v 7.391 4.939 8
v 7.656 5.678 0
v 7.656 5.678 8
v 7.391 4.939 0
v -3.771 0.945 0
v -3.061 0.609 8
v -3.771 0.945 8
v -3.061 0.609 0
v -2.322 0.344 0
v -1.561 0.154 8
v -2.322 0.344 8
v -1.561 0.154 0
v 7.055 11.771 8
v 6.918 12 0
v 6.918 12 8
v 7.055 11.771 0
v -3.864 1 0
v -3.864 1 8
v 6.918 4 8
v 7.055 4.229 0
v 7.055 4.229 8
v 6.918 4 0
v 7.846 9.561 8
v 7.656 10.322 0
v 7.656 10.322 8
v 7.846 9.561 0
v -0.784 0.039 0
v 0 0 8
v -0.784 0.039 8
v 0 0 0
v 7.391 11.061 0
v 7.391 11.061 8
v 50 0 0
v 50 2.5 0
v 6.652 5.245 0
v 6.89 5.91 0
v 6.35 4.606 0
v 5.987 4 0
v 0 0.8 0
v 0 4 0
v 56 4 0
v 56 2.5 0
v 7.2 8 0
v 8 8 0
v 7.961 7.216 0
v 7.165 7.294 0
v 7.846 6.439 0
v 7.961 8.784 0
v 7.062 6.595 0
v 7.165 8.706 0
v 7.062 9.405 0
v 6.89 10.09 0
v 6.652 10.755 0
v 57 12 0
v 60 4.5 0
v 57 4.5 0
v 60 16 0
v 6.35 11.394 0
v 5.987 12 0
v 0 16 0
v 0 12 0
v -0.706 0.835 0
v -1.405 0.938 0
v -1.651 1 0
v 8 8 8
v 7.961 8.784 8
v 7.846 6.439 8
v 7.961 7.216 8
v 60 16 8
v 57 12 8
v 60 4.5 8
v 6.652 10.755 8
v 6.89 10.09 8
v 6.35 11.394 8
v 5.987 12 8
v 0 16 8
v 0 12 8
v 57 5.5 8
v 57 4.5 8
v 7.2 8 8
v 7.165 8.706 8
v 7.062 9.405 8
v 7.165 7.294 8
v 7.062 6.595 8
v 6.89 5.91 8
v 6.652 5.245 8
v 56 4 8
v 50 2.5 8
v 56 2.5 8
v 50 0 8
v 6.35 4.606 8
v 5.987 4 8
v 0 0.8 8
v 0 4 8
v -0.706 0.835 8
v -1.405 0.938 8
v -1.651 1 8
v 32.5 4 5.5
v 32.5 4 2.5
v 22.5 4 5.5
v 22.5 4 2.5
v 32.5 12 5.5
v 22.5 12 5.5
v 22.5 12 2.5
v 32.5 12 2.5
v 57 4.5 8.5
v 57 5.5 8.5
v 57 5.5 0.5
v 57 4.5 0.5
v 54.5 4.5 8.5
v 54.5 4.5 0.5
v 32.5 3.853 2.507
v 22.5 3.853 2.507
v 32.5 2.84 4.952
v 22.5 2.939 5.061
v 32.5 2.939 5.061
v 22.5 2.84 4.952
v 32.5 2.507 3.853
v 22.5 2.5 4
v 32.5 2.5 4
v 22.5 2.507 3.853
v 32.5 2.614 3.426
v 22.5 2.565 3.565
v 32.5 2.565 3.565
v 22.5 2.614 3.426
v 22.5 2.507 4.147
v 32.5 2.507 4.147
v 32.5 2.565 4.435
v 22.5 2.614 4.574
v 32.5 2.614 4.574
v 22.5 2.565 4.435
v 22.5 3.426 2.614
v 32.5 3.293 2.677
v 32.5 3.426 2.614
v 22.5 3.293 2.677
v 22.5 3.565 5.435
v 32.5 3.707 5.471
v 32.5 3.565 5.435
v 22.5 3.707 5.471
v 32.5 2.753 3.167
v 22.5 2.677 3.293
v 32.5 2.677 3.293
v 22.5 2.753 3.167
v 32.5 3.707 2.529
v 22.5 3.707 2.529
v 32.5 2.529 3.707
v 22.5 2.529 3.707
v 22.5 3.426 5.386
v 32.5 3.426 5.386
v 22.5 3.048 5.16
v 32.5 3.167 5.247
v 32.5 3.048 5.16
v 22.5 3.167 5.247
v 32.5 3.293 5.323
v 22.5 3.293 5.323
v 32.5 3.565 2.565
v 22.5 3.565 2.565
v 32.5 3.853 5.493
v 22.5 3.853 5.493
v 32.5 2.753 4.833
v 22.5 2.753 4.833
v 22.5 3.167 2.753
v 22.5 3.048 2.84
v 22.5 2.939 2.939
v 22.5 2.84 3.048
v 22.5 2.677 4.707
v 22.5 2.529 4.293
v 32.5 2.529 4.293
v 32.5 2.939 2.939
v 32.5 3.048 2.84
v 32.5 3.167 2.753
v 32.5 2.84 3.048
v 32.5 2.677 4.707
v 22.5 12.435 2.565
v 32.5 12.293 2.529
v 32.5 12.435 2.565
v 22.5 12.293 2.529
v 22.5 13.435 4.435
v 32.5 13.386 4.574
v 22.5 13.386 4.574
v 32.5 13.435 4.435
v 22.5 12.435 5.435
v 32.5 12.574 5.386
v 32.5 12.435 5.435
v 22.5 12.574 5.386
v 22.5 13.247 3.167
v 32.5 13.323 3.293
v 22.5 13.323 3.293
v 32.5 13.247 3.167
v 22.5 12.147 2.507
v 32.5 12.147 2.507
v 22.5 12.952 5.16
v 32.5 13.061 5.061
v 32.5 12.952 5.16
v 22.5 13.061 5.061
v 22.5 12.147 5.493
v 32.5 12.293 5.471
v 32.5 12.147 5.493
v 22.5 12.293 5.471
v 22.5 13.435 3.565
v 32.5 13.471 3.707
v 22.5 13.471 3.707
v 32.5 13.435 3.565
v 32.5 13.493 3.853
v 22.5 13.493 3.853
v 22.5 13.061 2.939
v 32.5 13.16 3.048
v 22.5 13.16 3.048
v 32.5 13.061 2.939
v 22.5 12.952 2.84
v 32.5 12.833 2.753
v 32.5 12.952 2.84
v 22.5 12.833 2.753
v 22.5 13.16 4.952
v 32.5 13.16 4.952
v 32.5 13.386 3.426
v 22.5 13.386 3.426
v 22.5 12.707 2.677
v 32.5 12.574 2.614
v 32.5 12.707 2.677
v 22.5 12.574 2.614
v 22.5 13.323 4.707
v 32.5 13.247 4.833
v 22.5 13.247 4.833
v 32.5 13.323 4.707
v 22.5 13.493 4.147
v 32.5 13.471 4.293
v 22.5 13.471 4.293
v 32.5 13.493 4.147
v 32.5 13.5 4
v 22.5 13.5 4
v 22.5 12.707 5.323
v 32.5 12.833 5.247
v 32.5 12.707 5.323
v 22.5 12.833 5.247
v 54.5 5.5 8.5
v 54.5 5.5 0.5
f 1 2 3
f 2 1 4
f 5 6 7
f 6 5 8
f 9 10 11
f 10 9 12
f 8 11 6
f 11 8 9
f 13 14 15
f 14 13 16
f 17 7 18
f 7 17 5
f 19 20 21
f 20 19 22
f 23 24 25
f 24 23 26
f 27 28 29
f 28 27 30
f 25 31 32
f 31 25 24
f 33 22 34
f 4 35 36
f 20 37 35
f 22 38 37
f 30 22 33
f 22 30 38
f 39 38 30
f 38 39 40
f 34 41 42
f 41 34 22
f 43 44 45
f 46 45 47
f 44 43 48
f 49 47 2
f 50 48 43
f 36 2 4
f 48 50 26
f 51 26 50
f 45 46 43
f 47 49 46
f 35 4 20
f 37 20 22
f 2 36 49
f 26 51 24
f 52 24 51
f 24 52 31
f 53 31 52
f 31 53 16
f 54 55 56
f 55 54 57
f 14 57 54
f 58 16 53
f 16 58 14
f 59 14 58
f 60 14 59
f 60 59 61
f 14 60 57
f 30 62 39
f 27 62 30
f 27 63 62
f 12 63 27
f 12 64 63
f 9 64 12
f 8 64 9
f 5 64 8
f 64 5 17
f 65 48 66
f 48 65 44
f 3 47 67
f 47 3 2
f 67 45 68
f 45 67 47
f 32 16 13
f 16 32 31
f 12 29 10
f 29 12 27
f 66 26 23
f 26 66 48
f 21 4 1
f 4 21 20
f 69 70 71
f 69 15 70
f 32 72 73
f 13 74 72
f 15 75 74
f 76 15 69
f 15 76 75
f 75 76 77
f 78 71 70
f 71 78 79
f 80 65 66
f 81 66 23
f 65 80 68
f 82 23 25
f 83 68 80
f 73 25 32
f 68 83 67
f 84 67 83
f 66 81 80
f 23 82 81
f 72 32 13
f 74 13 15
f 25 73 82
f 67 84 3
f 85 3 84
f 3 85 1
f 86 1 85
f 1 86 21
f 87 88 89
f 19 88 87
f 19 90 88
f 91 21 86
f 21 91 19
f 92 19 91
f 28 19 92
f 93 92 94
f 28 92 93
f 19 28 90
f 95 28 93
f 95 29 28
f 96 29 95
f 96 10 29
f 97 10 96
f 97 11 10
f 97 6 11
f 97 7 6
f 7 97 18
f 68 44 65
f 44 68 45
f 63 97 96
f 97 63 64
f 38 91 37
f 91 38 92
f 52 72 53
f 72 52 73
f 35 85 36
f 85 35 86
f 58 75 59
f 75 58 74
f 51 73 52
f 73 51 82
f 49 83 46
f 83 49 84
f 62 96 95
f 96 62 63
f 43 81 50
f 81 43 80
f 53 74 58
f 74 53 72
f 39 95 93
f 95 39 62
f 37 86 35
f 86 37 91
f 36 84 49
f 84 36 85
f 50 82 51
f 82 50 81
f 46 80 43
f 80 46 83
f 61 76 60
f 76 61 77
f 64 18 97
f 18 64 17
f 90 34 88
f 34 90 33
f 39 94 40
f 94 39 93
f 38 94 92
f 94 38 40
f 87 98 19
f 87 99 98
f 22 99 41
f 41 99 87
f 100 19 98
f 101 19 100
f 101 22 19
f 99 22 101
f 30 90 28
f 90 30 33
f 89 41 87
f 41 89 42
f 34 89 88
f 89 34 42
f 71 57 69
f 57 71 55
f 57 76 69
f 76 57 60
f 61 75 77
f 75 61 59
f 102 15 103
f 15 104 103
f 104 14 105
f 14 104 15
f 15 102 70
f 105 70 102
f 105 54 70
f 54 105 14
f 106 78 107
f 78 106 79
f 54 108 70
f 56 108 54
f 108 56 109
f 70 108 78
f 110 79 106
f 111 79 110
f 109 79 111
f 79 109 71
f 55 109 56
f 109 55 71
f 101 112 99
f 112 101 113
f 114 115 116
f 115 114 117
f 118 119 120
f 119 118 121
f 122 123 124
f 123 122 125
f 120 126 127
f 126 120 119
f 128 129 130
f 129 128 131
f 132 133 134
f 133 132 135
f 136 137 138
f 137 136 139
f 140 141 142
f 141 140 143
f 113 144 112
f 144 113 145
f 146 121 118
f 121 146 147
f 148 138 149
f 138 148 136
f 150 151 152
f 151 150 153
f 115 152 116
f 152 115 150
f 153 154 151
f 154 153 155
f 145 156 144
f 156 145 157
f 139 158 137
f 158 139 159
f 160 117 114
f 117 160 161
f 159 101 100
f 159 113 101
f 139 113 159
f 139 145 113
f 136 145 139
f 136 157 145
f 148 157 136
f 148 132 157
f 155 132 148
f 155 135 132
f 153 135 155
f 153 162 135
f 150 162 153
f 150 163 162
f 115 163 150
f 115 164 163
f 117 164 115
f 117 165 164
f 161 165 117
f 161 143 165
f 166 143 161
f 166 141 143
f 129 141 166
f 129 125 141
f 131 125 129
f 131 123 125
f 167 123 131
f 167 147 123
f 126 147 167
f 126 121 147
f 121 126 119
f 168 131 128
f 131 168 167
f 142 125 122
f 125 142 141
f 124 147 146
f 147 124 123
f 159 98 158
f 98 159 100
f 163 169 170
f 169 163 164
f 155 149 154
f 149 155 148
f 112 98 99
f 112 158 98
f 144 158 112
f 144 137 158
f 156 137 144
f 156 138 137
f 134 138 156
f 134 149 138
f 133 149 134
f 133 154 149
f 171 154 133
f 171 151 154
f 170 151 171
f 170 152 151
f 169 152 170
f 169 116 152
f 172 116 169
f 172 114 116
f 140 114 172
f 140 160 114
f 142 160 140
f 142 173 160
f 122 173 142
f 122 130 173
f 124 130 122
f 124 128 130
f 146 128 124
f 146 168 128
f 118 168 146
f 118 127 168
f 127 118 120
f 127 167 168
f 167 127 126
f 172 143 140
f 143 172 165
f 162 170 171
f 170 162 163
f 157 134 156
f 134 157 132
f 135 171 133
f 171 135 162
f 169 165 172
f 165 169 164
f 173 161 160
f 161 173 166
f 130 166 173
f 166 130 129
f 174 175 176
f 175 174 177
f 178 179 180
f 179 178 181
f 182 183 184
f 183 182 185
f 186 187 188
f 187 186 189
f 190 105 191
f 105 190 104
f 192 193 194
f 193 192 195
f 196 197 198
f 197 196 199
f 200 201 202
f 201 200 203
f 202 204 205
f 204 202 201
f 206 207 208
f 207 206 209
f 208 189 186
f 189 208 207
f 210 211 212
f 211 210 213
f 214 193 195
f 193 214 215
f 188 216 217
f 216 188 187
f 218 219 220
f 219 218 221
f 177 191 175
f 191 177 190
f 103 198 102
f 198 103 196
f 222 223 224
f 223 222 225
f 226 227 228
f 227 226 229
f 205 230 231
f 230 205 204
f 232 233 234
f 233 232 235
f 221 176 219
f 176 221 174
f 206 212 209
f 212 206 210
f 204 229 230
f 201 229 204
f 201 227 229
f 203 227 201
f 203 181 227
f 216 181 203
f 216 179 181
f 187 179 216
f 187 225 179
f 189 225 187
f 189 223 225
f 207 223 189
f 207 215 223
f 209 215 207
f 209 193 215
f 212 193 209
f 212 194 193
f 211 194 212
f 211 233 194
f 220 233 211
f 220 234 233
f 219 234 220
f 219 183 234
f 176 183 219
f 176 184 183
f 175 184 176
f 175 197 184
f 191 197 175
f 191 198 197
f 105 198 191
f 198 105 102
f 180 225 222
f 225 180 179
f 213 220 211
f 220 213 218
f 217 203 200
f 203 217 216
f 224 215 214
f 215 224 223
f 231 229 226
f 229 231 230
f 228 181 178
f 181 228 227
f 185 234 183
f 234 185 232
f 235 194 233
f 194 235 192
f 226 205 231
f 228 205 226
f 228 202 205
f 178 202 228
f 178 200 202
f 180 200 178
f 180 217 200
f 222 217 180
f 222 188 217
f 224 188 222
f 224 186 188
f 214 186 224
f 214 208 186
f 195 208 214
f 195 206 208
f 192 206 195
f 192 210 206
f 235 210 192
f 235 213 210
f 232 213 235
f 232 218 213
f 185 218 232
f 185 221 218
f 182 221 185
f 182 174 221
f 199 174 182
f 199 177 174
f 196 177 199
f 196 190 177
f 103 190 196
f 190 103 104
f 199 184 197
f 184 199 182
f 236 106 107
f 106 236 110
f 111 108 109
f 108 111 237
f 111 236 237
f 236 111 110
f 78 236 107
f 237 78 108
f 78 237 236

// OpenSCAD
// --- Parameters ---
// Dimensions in mm
thickness = 8;               // Extrusion depth along Z
lower_bar_len = 50;          // Length of lower bar
lower_bar_width = 4;         // Width of lower bar
lower_tongue_len = 6;         // Length of lower tongue (50 to 56)
lower_tongue_width = 1.5;    // Width of lower tongue (4 - 2.5 = 1.5)
lower_tongue_start_y = 2.5; // Y-offset for tongue

upper_bar_len = 60;          // Length of upper bar
upper_bar_width = 4;         // Width of upper bar
upper_bar_y_start = 12;      // Y-position of upper bar start
upper_bar_y_end = 16;        // Y-position of upper bar end

hinge_radius_inner = 7.2;    // Inner radius of hinge
hinge_radius_outer = 8.0;    // Outer radius of hinge
hinge_center_x = 0;          // X-center of hinge
hinge_center_y = 8;          // Y-center of hinge

pinch_ridge_radius = 1.5;    // Radius of the half-round ridge
pinch_ridge_x = 27.5;        // X-position of the ridge

latch_leg_x_start = 57;       // Start of latch leg
latch_leg_x_end = 60;         // End of latch leg
latch_leg_y_start = 4.5;      // Start of latch leg Y
latch_leg_y_end = 12;        // End of latch leg Y

latch_nose_x_start = 54.5;    // Start of latch nose
latch_nose_x_end = 57;        // End of latch nose
latch_nose_y_start = 4.5;     // Start of latch nose Y
latch_nose_y_end = 5.5;       // End of latch nose Y
latch_nose_z_offset = 0.5;    // Z-offset for the nose relative to the tongue

$fn = 64;

// --- Construction ---

module pinch_clamp() {
    // The user wants a 2D profile extruded 8mm along Z.
    // The latch nose is "0.5mm above the tongue". 
    // In a single extrusion, this implies the nose is a separate volume 
    // or the profile is complex. To maintain a single watertight solid 
    // that is a "2D profile extruded 8mm", the nose must be part of the 
    // 2D profile, but the prompt says "0.5mm above", implying Z-offset.
    // To ensure a single solid, we union the extruded profile and the nose.
    
    union() {
        difference() {
            union() {
                // 1. Lower Jaw Bar
                cube([lower_bar_len, lower_bar_width, thickness]);
                
                // 2. Lower Jaw Tongue
                translate([lower_bar_len, lower_tongue_start_y, 0])
                    cube([lower_tongue_len, lower_tongue_width, thickness]);
                
                // 3. Upper Jaw Bar
                translate([0, upper_bar_y_start, 0])
                    cube([upper_bar_len, upper_bar_width, thickness]);
                
                // 4. Hinge (Half-ring on the left)
                // Centered at (0,8), radii 7.2 and 8.0. 
                // To be a single solid, we use a hull or union of cylinders.
                translate([hinge_center_x, hinge_center_y, 0])
                rotate([0, 0, 180])
                difference() {
                    cylinder(r = hinge_radius_outer, h = thickness);
                    cylinder(r = hinge_radius_inner, h = thickness + 0.1);
                    // Cut to make it a half-ring (left side)
                    // Since we rotated 180, the "left" is now the "right" relative to the rotation.
                    // We cut the right half to leave the left half.
                    translate([0, -hinge_radius_outer - 1, -0.5])
                        cube([hinge_radius_outer + 1, hinge_radius_outer * 2, thickness + 1]);
                }
                
                // 5. Latch Leg
                translate([latch_leg_x_start, latch_leg_y_start, 0])
                    cube([latch_leg_x_end - latch_leg_x_start, latch_leg_y_end - latch_leg_y_start, thickness]);
            }

            // --- Subtractions (Cuts) ---

            // 6. Lower Pinch Ridge (Half-round cut into the inner face)
            // Inner face of lower bar is at y = 4.
            translate([pinch_ridge_x, lower_bar_width, thickness/2])
                rotate([0, 90, 0])
                cylinder(r = pinch_ridge_radius, h = 10, center = true);
            
            // 7. Upper Pinch Ridge (Half-round cut into the inner face)
            // Inner face of upper bar is at y = 12.
            translate([pinch_ridge_x, upper_bar_y_start, thickness/2])
                rotate([0, 90, 0])
                cylinder(r = pinch_ridge_radius, h = 10, center = true);
        }

        // 8. Latch Nose (The part that snaps)
        // "0.5 mm above the tongue" -> Z-offset.
        // To ensure it's part of the same solid and watertight:
        translate([latch_nose_x_start, latch_nose_y_start, latch_nose_z_offset])
            cube([latch_nose_x_end - latch_nose_x_start, latch_nose_y_end - latch_nose_y_start, thickness]);
    }
}

// Render the part
pinch_clamp();
